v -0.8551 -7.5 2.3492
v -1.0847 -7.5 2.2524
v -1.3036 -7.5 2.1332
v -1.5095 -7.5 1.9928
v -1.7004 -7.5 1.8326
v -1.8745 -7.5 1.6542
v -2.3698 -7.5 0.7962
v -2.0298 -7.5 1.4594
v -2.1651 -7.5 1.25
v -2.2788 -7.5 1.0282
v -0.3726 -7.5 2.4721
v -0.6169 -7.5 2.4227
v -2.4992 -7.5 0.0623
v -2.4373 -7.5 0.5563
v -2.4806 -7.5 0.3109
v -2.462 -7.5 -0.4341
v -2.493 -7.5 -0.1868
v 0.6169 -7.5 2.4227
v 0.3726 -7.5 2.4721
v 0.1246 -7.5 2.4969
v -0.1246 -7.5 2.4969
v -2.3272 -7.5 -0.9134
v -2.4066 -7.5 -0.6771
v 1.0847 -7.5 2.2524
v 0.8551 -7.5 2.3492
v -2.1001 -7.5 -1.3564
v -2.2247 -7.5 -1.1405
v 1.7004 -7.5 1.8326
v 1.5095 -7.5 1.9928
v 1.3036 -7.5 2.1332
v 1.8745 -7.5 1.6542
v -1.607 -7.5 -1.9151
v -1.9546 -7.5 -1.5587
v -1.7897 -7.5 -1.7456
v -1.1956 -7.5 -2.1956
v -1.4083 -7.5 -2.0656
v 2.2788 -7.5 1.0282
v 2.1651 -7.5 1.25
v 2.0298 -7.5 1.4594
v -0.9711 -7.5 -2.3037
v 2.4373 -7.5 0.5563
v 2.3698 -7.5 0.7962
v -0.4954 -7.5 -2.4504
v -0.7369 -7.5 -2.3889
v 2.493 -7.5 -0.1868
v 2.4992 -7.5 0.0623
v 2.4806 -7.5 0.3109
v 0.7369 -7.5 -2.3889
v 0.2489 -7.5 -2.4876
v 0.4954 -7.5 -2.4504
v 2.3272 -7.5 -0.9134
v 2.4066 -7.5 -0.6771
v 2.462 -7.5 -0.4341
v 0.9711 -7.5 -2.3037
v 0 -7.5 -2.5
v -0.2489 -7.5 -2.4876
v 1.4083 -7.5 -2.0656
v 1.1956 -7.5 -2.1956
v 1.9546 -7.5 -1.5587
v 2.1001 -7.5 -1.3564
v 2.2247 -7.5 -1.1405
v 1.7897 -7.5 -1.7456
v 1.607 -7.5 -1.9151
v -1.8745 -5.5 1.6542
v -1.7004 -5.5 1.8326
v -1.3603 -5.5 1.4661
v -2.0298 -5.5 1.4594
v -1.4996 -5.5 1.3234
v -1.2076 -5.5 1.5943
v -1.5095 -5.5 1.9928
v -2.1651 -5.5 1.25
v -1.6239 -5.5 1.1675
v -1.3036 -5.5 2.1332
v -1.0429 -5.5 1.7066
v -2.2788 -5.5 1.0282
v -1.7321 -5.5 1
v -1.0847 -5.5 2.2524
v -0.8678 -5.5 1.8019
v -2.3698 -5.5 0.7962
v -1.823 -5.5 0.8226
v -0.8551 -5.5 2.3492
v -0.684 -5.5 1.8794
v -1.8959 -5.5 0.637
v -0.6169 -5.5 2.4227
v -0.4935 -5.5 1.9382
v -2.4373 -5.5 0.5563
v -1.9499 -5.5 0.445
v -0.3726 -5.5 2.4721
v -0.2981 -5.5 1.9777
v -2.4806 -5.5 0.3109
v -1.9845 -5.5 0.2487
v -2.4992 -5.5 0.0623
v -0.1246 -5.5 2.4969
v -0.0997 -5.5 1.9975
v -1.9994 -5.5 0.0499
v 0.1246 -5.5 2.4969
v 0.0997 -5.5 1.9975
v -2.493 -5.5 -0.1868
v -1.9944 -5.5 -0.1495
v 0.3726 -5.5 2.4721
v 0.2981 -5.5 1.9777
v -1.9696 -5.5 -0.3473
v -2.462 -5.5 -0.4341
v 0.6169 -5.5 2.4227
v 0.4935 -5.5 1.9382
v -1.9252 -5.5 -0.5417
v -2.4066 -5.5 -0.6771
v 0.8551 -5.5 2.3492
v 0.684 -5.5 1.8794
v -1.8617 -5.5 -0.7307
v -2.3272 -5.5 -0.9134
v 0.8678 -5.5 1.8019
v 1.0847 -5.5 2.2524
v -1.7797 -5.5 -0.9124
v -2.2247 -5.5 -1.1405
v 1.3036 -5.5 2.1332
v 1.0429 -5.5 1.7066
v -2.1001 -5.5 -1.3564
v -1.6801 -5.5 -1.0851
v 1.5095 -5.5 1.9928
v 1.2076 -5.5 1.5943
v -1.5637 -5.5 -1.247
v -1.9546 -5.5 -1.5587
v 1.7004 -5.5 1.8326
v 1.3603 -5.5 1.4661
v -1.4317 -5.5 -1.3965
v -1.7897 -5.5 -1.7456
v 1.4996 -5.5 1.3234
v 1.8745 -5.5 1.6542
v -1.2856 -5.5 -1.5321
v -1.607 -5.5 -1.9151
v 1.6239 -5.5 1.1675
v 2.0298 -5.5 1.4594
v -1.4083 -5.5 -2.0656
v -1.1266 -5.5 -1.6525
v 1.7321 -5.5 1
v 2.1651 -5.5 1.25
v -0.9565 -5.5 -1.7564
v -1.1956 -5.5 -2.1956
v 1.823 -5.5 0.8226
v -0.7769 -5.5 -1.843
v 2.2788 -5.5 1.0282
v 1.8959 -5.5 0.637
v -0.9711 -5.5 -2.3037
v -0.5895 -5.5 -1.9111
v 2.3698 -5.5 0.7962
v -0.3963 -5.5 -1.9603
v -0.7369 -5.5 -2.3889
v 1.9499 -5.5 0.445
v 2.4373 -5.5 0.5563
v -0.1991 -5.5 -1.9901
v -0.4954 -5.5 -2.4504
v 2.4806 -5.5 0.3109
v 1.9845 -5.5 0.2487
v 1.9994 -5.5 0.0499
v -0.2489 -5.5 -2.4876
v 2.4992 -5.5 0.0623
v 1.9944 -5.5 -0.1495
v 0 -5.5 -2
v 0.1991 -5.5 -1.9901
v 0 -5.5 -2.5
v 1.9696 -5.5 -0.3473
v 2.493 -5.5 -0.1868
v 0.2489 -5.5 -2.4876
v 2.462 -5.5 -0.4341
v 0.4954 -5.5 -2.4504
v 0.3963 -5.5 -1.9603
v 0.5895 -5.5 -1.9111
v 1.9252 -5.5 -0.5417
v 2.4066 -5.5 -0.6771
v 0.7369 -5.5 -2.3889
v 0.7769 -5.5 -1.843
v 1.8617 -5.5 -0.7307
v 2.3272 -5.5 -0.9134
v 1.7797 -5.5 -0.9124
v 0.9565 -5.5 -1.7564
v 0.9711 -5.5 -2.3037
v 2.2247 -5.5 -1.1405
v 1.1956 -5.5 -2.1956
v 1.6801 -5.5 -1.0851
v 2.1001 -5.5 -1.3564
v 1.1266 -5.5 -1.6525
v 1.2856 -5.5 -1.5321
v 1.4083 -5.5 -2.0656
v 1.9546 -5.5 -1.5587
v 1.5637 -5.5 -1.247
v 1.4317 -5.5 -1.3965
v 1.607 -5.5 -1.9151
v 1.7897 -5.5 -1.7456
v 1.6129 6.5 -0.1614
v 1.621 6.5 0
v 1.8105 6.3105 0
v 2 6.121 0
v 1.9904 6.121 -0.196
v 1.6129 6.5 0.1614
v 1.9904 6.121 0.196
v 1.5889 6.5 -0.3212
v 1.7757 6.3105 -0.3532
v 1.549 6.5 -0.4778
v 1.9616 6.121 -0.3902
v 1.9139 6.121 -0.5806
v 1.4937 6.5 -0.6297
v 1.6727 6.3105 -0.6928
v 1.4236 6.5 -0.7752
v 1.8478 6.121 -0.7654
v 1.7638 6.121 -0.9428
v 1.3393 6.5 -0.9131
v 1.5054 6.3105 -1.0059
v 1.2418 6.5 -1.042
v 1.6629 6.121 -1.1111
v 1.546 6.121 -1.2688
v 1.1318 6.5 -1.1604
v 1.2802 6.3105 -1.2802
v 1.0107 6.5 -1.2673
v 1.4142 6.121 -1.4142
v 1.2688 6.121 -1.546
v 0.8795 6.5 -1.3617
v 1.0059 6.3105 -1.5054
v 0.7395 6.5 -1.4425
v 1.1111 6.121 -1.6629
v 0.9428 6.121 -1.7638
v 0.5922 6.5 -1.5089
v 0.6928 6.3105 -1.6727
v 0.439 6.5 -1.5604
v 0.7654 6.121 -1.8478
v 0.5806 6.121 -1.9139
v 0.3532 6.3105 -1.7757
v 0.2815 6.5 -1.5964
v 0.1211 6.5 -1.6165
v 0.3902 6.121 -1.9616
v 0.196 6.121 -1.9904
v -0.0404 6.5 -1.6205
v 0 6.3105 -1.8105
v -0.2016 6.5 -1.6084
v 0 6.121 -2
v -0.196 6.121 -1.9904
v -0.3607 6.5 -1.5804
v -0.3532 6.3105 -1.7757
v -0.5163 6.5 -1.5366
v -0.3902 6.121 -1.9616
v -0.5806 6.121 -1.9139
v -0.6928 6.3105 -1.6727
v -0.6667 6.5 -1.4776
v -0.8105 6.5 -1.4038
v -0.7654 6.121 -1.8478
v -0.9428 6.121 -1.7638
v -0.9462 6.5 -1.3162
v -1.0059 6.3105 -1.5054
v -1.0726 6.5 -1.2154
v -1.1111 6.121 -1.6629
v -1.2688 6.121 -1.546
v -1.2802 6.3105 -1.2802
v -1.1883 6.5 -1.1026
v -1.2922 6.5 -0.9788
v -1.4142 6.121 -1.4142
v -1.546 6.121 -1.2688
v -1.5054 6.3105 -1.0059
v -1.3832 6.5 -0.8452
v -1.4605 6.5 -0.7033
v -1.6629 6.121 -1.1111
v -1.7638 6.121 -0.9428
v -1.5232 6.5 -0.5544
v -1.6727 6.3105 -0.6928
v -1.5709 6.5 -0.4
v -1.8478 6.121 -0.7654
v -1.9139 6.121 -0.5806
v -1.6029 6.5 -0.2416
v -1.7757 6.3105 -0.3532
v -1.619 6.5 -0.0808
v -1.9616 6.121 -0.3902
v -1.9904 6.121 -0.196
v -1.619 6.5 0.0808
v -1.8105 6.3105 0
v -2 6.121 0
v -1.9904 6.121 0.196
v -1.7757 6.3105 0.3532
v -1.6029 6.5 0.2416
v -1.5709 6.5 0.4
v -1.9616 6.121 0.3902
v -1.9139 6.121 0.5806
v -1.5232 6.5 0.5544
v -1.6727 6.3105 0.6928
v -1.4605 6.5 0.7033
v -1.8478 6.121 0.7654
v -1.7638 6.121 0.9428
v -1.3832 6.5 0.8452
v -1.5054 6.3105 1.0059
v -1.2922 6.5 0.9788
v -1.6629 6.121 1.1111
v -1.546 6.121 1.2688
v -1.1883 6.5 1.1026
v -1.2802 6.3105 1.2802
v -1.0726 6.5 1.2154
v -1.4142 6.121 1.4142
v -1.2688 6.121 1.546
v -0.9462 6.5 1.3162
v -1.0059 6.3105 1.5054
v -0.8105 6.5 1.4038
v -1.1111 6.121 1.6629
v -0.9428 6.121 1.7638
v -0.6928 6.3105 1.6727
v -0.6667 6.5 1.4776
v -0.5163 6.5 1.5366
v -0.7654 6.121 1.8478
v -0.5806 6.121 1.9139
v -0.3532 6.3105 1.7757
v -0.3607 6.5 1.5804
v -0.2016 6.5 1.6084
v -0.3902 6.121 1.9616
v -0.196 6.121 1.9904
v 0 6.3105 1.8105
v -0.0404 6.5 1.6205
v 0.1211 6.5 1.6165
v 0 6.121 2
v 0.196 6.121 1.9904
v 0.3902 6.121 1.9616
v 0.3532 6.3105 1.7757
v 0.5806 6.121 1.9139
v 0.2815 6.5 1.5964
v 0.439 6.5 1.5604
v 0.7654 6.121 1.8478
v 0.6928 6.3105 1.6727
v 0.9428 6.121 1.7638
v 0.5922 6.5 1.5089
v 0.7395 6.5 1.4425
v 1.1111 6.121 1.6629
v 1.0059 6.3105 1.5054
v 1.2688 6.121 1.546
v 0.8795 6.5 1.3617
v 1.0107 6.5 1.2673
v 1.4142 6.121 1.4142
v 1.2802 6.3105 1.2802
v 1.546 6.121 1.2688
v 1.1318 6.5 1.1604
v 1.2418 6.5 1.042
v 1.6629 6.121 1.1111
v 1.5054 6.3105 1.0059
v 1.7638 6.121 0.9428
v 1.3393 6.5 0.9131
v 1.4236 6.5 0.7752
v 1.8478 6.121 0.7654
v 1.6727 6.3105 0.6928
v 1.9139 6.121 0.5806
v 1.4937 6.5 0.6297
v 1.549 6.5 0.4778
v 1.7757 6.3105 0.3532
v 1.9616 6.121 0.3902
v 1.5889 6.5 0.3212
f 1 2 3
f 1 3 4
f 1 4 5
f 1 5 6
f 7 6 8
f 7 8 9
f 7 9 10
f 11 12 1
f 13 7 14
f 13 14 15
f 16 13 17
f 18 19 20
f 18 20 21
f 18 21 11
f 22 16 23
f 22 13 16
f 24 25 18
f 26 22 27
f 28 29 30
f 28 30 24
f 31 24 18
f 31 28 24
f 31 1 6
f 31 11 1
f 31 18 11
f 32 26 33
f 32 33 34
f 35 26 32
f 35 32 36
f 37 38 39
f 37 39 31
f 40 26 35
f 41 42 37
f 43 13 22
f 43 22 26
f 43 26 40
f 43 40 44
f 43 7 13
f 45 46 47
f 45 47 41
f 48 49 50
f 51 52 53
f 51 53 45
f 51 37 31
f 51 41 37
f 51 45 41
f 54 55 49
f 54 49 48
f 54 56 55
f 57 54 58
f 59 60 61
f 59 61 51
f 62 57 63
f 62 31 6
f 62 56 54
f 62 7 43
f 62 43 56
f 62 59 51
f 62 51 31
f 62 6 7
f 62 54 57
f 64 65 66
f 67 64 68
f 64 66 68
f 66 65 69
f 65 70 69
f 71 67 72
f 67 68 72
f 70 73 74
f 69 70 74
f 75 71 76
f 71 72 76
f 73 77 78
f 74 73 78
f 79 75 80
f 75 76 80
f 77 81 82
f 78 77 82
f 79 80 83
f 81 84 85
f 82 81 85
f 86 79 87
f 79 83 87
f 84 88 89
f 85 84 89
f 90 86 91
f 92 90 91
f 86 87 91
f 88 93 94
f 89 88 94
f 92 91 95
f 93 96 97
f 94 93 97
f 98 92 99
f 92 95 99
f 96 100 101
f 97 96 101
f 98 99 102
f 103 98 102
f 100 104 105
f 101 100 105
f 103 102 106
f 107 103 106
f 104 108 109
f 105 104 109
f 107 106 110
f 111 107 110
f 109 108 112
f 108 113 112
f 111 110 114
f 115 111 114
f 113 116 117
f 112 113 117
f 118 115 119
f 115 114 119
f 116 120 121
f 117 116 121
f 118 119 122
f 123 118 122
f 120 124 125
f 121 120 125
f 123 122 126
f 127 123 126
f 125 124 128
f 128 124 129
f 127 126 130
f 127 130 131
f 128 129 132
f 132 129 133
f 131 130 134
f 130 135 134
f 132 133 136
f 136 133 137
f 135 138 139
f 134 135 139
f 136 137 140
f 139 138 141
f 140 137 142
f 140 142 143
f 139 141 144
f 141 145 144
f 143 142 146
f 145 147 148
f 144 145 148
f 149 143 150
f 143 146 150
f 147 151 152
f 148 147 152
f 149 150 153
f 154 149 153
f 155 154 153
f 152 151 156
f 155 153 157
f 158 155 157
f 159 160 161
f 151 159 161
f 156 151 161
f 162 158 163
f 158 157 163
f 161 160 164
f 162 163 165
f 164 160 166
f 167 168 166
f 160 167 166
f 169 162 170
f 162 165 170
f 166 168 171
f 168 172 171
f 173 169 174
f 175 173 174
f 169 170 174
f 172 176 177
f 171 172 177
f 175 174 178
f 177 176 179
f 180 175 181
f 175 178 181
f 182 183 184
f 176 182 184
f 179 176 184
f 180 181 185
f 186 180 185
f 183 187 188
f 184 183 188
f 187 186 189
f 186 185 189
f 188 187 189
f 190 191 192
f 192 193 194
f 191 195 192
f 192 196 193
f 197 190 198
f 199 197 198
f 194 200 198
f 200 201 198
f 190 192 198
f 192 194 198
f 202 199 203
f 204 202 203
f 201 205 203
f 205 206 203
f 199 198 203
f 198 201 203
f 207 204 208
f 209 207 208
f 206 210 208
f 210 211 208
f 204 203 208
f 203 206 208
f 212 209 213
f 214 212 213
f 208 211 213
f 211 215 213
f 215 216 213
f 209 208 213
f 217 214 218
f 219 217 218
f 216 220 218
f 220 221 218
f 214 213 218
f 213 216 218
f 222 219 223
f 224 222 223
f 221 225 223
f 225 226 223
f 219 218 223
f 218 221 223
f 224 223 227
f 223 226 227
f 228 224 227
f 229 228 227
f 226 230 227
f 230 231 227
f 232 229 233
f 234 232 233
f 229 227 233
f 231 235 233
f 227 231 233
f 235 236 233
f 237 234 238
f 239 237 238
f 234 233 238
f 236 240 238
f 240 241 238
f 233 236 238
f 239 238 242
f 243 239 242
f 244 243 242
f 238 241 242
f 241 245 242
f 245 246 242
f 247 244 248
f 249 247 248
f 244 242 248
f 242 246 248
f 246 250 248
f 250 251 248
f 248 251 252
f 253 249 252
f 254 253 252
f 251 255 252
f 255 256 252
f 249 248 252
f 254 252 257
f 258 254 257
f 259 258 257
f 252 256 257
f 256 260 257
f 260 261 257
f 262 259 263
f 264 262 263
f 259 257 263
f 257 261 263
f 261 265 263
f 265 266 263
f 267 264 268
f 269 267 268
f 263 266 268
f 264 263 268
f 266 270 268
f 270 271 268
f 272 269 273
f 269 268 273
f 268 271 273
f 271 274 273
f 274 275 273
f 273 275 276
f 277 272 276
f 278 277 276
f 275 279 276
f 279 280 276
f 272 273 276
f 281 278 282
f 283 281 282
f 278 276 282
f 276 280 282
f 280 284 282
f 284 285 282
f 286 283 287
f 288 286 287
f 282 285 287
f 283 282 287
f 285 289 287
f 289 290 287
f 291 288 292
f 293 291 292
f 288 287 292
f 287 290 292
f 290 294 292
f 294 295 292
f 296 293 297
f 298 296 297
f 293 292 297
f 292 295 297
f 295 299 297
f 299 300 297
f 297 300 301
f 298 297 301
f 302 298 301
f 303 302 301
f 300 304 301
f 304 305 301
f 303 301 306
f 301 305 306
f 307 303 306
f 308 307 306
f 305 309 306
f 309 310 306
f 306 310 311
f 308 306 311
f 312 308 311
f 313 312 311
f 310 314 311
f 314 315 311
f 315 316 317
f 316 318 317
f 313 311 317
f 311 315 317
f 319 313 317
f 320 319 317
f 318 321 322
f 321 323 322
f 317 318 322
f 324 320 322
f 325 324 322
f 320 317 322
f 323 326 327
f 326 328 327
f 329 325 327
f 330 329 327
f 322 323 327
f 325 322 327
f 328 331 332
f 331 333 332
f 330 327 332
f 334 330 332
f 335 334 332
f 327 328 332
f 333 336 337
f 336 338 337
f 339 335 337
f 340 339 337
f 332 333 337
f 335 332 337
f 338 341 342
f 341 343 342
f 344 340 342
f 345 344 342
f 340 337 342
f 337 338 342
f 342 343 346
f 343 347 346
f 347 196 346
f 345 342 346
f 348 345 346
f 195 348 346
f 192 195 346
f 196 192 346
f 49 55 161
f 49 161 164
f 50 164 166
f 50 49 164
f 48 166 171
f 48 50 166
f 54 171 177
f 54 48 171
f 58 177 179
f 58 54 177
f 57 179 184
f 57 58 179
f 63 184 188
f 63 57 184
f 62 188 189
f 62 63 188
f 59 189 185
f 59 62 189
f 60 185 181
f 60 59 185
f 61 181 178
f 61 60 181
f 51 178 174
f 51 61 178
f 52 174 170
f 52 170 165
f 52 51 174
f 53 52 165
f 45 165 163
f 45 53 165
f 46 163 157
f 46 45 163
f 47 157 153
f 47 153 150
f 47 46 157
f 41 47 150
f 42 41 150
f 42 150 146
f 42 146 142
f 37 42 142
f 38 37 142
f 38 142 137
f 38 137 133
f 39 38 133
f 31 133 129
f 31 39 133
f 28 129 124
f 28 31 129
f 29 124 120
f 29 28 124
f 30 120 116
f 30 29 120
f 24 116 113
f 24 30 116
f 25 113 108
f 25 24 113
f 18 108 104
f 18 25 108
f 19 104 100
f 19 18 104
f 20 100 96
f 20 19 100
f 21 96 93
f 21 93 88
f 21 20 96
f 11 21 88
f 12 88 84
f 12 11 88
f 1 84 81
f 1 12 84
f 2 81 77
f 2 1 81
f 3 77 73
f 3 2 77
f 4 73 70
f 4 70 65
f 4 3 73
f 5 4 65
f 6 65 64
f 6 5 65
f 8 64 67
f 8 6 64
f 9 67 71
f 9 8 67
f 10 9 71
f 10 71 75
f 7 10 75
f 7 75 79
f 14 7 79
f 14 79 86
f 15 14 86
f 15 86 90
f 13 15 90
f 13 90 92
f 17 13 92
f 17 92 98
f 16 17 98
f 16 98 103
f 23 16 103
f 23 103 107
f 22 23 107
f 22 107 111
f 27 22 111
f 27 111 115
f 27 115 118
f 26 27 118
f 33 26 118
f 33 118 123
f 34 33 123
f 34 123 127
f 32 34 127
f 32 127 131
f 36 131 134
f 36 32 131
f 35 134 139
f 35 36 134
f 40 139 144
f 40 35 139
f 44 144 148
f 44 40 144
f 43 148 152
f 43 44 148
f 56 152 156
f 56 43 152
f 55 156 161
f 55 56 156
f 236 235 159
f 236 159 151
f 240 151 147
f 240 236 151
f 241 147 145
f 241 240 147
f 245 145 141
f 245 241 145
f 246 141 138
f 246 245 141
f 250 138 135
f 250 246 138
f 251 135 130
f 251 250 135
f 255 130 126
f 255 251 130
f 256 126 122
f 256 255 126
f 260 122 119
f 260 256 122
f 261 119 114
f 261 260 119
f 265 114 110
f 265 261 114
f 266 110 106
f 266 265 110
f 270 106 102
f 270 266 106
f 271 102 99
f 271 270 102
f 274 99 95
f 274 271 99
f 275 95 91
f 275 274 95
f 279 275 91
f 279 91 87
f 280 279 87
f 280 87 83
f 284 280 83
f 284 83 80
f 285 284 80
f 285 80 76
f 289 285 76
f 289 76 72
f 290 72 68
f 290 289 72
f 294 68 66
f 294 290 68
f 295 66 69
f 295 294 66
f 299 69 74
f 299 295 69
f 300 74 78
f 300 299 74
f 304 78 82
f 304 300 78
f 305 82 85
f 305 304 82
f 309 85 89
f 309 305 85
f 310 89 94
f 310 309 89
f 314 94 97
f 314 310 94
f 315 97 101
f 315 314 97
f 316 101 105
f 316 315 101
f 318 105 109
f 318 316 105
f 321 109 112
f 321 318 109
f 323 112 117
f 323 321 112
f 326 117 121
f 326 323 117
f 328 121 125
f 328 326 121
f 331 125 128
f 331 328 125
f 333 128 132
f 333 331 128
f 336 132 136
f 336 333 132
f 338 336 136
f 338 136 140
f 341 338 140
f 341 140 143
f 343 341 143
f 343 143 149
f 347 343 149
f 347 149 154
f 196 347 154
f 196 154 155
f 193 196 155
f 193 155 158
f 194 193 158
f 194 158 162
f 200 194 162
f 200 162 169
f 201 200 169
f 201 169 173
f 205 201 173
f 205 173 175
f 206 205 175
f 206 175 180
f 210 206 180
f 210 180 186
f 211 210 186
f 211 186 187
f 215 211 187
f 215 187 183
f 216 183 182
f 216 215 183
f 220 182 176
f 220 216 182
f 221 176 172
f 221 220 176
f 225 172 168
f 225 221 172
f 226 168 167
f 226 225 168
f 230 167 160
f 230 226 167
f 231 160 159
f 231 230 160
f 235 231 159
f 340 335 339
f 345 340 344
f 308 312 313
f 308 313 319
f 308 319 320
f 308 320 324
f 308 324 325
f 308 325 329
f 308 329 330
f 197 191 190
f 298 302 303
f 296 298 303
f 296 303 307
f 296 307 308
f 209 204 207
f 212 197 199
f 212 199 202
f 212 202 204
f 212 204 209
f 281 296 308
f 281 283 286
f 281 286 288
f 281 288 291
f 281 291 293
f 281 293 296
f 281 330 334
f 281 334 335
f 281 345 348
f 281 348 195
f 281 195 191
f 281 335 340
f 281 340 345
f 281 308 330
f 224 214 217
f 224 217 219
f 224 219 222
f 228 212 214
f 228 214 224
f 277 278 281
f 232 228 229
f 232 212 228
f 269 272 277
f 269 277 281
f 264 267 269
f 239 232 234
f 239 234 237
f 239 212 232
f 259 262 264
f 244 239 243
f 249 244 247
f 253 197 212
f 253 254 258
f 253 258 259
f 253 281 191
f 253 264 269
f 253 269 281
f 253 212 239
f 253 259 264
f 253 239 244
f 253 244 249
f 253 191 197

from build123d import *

# Parameters (mm, degrees)
SKETCH_1_R      = 2
EXTRUDE_1_DEPTH = 6.5
EXTRUDE_START   = 1
SKETCH_2_R      = 2.5
EXTRUDE_2_DEPTH = 2


# Read off the part's stored shape, not the designer's step: M4 机械螺纹 螺柱1
with BuildPart() as part:
    # 草图1 → 凸台-拉伸1 (new, symmetric)
    with BuildSketch(Plane(origin=(0, 0, 0), x_dir=(1, 0, 0), z_dir=(0, 1, 0))):
        with Locations(Location((0, 0, 0), (0, 0, 90))):
            Circle(SKETCH_1_R)
    extrude(amount=EXTRUDE_1_DEPTH, both=True)

    # 草图2 → 凸台-拉伸2 (add)
    with BuildSketch(Plane.XZ.offset(6.5).offset(EXTRUDE_START)):
        with Locations(Location((0, 0, 0), (0, 0, 270))):
            Circle(SKETCH_2_R)
    extrude(amount=-EXTRUDE_2_DEPTH)

    # M4 机械螺纹 螺柱1 outline → M4 机械螺纹 螺柱1 (revolve, cut)
    with BuildSketch(Plane.XY):
        Polygon((2, 6.5), (1.621, 6.5), (2, 6.121), align=None)
    revolve(axis=Axis((0, 0, 0), (0, 1, 0)), mode=Mode.SUBTRACT)


solid = part.part
